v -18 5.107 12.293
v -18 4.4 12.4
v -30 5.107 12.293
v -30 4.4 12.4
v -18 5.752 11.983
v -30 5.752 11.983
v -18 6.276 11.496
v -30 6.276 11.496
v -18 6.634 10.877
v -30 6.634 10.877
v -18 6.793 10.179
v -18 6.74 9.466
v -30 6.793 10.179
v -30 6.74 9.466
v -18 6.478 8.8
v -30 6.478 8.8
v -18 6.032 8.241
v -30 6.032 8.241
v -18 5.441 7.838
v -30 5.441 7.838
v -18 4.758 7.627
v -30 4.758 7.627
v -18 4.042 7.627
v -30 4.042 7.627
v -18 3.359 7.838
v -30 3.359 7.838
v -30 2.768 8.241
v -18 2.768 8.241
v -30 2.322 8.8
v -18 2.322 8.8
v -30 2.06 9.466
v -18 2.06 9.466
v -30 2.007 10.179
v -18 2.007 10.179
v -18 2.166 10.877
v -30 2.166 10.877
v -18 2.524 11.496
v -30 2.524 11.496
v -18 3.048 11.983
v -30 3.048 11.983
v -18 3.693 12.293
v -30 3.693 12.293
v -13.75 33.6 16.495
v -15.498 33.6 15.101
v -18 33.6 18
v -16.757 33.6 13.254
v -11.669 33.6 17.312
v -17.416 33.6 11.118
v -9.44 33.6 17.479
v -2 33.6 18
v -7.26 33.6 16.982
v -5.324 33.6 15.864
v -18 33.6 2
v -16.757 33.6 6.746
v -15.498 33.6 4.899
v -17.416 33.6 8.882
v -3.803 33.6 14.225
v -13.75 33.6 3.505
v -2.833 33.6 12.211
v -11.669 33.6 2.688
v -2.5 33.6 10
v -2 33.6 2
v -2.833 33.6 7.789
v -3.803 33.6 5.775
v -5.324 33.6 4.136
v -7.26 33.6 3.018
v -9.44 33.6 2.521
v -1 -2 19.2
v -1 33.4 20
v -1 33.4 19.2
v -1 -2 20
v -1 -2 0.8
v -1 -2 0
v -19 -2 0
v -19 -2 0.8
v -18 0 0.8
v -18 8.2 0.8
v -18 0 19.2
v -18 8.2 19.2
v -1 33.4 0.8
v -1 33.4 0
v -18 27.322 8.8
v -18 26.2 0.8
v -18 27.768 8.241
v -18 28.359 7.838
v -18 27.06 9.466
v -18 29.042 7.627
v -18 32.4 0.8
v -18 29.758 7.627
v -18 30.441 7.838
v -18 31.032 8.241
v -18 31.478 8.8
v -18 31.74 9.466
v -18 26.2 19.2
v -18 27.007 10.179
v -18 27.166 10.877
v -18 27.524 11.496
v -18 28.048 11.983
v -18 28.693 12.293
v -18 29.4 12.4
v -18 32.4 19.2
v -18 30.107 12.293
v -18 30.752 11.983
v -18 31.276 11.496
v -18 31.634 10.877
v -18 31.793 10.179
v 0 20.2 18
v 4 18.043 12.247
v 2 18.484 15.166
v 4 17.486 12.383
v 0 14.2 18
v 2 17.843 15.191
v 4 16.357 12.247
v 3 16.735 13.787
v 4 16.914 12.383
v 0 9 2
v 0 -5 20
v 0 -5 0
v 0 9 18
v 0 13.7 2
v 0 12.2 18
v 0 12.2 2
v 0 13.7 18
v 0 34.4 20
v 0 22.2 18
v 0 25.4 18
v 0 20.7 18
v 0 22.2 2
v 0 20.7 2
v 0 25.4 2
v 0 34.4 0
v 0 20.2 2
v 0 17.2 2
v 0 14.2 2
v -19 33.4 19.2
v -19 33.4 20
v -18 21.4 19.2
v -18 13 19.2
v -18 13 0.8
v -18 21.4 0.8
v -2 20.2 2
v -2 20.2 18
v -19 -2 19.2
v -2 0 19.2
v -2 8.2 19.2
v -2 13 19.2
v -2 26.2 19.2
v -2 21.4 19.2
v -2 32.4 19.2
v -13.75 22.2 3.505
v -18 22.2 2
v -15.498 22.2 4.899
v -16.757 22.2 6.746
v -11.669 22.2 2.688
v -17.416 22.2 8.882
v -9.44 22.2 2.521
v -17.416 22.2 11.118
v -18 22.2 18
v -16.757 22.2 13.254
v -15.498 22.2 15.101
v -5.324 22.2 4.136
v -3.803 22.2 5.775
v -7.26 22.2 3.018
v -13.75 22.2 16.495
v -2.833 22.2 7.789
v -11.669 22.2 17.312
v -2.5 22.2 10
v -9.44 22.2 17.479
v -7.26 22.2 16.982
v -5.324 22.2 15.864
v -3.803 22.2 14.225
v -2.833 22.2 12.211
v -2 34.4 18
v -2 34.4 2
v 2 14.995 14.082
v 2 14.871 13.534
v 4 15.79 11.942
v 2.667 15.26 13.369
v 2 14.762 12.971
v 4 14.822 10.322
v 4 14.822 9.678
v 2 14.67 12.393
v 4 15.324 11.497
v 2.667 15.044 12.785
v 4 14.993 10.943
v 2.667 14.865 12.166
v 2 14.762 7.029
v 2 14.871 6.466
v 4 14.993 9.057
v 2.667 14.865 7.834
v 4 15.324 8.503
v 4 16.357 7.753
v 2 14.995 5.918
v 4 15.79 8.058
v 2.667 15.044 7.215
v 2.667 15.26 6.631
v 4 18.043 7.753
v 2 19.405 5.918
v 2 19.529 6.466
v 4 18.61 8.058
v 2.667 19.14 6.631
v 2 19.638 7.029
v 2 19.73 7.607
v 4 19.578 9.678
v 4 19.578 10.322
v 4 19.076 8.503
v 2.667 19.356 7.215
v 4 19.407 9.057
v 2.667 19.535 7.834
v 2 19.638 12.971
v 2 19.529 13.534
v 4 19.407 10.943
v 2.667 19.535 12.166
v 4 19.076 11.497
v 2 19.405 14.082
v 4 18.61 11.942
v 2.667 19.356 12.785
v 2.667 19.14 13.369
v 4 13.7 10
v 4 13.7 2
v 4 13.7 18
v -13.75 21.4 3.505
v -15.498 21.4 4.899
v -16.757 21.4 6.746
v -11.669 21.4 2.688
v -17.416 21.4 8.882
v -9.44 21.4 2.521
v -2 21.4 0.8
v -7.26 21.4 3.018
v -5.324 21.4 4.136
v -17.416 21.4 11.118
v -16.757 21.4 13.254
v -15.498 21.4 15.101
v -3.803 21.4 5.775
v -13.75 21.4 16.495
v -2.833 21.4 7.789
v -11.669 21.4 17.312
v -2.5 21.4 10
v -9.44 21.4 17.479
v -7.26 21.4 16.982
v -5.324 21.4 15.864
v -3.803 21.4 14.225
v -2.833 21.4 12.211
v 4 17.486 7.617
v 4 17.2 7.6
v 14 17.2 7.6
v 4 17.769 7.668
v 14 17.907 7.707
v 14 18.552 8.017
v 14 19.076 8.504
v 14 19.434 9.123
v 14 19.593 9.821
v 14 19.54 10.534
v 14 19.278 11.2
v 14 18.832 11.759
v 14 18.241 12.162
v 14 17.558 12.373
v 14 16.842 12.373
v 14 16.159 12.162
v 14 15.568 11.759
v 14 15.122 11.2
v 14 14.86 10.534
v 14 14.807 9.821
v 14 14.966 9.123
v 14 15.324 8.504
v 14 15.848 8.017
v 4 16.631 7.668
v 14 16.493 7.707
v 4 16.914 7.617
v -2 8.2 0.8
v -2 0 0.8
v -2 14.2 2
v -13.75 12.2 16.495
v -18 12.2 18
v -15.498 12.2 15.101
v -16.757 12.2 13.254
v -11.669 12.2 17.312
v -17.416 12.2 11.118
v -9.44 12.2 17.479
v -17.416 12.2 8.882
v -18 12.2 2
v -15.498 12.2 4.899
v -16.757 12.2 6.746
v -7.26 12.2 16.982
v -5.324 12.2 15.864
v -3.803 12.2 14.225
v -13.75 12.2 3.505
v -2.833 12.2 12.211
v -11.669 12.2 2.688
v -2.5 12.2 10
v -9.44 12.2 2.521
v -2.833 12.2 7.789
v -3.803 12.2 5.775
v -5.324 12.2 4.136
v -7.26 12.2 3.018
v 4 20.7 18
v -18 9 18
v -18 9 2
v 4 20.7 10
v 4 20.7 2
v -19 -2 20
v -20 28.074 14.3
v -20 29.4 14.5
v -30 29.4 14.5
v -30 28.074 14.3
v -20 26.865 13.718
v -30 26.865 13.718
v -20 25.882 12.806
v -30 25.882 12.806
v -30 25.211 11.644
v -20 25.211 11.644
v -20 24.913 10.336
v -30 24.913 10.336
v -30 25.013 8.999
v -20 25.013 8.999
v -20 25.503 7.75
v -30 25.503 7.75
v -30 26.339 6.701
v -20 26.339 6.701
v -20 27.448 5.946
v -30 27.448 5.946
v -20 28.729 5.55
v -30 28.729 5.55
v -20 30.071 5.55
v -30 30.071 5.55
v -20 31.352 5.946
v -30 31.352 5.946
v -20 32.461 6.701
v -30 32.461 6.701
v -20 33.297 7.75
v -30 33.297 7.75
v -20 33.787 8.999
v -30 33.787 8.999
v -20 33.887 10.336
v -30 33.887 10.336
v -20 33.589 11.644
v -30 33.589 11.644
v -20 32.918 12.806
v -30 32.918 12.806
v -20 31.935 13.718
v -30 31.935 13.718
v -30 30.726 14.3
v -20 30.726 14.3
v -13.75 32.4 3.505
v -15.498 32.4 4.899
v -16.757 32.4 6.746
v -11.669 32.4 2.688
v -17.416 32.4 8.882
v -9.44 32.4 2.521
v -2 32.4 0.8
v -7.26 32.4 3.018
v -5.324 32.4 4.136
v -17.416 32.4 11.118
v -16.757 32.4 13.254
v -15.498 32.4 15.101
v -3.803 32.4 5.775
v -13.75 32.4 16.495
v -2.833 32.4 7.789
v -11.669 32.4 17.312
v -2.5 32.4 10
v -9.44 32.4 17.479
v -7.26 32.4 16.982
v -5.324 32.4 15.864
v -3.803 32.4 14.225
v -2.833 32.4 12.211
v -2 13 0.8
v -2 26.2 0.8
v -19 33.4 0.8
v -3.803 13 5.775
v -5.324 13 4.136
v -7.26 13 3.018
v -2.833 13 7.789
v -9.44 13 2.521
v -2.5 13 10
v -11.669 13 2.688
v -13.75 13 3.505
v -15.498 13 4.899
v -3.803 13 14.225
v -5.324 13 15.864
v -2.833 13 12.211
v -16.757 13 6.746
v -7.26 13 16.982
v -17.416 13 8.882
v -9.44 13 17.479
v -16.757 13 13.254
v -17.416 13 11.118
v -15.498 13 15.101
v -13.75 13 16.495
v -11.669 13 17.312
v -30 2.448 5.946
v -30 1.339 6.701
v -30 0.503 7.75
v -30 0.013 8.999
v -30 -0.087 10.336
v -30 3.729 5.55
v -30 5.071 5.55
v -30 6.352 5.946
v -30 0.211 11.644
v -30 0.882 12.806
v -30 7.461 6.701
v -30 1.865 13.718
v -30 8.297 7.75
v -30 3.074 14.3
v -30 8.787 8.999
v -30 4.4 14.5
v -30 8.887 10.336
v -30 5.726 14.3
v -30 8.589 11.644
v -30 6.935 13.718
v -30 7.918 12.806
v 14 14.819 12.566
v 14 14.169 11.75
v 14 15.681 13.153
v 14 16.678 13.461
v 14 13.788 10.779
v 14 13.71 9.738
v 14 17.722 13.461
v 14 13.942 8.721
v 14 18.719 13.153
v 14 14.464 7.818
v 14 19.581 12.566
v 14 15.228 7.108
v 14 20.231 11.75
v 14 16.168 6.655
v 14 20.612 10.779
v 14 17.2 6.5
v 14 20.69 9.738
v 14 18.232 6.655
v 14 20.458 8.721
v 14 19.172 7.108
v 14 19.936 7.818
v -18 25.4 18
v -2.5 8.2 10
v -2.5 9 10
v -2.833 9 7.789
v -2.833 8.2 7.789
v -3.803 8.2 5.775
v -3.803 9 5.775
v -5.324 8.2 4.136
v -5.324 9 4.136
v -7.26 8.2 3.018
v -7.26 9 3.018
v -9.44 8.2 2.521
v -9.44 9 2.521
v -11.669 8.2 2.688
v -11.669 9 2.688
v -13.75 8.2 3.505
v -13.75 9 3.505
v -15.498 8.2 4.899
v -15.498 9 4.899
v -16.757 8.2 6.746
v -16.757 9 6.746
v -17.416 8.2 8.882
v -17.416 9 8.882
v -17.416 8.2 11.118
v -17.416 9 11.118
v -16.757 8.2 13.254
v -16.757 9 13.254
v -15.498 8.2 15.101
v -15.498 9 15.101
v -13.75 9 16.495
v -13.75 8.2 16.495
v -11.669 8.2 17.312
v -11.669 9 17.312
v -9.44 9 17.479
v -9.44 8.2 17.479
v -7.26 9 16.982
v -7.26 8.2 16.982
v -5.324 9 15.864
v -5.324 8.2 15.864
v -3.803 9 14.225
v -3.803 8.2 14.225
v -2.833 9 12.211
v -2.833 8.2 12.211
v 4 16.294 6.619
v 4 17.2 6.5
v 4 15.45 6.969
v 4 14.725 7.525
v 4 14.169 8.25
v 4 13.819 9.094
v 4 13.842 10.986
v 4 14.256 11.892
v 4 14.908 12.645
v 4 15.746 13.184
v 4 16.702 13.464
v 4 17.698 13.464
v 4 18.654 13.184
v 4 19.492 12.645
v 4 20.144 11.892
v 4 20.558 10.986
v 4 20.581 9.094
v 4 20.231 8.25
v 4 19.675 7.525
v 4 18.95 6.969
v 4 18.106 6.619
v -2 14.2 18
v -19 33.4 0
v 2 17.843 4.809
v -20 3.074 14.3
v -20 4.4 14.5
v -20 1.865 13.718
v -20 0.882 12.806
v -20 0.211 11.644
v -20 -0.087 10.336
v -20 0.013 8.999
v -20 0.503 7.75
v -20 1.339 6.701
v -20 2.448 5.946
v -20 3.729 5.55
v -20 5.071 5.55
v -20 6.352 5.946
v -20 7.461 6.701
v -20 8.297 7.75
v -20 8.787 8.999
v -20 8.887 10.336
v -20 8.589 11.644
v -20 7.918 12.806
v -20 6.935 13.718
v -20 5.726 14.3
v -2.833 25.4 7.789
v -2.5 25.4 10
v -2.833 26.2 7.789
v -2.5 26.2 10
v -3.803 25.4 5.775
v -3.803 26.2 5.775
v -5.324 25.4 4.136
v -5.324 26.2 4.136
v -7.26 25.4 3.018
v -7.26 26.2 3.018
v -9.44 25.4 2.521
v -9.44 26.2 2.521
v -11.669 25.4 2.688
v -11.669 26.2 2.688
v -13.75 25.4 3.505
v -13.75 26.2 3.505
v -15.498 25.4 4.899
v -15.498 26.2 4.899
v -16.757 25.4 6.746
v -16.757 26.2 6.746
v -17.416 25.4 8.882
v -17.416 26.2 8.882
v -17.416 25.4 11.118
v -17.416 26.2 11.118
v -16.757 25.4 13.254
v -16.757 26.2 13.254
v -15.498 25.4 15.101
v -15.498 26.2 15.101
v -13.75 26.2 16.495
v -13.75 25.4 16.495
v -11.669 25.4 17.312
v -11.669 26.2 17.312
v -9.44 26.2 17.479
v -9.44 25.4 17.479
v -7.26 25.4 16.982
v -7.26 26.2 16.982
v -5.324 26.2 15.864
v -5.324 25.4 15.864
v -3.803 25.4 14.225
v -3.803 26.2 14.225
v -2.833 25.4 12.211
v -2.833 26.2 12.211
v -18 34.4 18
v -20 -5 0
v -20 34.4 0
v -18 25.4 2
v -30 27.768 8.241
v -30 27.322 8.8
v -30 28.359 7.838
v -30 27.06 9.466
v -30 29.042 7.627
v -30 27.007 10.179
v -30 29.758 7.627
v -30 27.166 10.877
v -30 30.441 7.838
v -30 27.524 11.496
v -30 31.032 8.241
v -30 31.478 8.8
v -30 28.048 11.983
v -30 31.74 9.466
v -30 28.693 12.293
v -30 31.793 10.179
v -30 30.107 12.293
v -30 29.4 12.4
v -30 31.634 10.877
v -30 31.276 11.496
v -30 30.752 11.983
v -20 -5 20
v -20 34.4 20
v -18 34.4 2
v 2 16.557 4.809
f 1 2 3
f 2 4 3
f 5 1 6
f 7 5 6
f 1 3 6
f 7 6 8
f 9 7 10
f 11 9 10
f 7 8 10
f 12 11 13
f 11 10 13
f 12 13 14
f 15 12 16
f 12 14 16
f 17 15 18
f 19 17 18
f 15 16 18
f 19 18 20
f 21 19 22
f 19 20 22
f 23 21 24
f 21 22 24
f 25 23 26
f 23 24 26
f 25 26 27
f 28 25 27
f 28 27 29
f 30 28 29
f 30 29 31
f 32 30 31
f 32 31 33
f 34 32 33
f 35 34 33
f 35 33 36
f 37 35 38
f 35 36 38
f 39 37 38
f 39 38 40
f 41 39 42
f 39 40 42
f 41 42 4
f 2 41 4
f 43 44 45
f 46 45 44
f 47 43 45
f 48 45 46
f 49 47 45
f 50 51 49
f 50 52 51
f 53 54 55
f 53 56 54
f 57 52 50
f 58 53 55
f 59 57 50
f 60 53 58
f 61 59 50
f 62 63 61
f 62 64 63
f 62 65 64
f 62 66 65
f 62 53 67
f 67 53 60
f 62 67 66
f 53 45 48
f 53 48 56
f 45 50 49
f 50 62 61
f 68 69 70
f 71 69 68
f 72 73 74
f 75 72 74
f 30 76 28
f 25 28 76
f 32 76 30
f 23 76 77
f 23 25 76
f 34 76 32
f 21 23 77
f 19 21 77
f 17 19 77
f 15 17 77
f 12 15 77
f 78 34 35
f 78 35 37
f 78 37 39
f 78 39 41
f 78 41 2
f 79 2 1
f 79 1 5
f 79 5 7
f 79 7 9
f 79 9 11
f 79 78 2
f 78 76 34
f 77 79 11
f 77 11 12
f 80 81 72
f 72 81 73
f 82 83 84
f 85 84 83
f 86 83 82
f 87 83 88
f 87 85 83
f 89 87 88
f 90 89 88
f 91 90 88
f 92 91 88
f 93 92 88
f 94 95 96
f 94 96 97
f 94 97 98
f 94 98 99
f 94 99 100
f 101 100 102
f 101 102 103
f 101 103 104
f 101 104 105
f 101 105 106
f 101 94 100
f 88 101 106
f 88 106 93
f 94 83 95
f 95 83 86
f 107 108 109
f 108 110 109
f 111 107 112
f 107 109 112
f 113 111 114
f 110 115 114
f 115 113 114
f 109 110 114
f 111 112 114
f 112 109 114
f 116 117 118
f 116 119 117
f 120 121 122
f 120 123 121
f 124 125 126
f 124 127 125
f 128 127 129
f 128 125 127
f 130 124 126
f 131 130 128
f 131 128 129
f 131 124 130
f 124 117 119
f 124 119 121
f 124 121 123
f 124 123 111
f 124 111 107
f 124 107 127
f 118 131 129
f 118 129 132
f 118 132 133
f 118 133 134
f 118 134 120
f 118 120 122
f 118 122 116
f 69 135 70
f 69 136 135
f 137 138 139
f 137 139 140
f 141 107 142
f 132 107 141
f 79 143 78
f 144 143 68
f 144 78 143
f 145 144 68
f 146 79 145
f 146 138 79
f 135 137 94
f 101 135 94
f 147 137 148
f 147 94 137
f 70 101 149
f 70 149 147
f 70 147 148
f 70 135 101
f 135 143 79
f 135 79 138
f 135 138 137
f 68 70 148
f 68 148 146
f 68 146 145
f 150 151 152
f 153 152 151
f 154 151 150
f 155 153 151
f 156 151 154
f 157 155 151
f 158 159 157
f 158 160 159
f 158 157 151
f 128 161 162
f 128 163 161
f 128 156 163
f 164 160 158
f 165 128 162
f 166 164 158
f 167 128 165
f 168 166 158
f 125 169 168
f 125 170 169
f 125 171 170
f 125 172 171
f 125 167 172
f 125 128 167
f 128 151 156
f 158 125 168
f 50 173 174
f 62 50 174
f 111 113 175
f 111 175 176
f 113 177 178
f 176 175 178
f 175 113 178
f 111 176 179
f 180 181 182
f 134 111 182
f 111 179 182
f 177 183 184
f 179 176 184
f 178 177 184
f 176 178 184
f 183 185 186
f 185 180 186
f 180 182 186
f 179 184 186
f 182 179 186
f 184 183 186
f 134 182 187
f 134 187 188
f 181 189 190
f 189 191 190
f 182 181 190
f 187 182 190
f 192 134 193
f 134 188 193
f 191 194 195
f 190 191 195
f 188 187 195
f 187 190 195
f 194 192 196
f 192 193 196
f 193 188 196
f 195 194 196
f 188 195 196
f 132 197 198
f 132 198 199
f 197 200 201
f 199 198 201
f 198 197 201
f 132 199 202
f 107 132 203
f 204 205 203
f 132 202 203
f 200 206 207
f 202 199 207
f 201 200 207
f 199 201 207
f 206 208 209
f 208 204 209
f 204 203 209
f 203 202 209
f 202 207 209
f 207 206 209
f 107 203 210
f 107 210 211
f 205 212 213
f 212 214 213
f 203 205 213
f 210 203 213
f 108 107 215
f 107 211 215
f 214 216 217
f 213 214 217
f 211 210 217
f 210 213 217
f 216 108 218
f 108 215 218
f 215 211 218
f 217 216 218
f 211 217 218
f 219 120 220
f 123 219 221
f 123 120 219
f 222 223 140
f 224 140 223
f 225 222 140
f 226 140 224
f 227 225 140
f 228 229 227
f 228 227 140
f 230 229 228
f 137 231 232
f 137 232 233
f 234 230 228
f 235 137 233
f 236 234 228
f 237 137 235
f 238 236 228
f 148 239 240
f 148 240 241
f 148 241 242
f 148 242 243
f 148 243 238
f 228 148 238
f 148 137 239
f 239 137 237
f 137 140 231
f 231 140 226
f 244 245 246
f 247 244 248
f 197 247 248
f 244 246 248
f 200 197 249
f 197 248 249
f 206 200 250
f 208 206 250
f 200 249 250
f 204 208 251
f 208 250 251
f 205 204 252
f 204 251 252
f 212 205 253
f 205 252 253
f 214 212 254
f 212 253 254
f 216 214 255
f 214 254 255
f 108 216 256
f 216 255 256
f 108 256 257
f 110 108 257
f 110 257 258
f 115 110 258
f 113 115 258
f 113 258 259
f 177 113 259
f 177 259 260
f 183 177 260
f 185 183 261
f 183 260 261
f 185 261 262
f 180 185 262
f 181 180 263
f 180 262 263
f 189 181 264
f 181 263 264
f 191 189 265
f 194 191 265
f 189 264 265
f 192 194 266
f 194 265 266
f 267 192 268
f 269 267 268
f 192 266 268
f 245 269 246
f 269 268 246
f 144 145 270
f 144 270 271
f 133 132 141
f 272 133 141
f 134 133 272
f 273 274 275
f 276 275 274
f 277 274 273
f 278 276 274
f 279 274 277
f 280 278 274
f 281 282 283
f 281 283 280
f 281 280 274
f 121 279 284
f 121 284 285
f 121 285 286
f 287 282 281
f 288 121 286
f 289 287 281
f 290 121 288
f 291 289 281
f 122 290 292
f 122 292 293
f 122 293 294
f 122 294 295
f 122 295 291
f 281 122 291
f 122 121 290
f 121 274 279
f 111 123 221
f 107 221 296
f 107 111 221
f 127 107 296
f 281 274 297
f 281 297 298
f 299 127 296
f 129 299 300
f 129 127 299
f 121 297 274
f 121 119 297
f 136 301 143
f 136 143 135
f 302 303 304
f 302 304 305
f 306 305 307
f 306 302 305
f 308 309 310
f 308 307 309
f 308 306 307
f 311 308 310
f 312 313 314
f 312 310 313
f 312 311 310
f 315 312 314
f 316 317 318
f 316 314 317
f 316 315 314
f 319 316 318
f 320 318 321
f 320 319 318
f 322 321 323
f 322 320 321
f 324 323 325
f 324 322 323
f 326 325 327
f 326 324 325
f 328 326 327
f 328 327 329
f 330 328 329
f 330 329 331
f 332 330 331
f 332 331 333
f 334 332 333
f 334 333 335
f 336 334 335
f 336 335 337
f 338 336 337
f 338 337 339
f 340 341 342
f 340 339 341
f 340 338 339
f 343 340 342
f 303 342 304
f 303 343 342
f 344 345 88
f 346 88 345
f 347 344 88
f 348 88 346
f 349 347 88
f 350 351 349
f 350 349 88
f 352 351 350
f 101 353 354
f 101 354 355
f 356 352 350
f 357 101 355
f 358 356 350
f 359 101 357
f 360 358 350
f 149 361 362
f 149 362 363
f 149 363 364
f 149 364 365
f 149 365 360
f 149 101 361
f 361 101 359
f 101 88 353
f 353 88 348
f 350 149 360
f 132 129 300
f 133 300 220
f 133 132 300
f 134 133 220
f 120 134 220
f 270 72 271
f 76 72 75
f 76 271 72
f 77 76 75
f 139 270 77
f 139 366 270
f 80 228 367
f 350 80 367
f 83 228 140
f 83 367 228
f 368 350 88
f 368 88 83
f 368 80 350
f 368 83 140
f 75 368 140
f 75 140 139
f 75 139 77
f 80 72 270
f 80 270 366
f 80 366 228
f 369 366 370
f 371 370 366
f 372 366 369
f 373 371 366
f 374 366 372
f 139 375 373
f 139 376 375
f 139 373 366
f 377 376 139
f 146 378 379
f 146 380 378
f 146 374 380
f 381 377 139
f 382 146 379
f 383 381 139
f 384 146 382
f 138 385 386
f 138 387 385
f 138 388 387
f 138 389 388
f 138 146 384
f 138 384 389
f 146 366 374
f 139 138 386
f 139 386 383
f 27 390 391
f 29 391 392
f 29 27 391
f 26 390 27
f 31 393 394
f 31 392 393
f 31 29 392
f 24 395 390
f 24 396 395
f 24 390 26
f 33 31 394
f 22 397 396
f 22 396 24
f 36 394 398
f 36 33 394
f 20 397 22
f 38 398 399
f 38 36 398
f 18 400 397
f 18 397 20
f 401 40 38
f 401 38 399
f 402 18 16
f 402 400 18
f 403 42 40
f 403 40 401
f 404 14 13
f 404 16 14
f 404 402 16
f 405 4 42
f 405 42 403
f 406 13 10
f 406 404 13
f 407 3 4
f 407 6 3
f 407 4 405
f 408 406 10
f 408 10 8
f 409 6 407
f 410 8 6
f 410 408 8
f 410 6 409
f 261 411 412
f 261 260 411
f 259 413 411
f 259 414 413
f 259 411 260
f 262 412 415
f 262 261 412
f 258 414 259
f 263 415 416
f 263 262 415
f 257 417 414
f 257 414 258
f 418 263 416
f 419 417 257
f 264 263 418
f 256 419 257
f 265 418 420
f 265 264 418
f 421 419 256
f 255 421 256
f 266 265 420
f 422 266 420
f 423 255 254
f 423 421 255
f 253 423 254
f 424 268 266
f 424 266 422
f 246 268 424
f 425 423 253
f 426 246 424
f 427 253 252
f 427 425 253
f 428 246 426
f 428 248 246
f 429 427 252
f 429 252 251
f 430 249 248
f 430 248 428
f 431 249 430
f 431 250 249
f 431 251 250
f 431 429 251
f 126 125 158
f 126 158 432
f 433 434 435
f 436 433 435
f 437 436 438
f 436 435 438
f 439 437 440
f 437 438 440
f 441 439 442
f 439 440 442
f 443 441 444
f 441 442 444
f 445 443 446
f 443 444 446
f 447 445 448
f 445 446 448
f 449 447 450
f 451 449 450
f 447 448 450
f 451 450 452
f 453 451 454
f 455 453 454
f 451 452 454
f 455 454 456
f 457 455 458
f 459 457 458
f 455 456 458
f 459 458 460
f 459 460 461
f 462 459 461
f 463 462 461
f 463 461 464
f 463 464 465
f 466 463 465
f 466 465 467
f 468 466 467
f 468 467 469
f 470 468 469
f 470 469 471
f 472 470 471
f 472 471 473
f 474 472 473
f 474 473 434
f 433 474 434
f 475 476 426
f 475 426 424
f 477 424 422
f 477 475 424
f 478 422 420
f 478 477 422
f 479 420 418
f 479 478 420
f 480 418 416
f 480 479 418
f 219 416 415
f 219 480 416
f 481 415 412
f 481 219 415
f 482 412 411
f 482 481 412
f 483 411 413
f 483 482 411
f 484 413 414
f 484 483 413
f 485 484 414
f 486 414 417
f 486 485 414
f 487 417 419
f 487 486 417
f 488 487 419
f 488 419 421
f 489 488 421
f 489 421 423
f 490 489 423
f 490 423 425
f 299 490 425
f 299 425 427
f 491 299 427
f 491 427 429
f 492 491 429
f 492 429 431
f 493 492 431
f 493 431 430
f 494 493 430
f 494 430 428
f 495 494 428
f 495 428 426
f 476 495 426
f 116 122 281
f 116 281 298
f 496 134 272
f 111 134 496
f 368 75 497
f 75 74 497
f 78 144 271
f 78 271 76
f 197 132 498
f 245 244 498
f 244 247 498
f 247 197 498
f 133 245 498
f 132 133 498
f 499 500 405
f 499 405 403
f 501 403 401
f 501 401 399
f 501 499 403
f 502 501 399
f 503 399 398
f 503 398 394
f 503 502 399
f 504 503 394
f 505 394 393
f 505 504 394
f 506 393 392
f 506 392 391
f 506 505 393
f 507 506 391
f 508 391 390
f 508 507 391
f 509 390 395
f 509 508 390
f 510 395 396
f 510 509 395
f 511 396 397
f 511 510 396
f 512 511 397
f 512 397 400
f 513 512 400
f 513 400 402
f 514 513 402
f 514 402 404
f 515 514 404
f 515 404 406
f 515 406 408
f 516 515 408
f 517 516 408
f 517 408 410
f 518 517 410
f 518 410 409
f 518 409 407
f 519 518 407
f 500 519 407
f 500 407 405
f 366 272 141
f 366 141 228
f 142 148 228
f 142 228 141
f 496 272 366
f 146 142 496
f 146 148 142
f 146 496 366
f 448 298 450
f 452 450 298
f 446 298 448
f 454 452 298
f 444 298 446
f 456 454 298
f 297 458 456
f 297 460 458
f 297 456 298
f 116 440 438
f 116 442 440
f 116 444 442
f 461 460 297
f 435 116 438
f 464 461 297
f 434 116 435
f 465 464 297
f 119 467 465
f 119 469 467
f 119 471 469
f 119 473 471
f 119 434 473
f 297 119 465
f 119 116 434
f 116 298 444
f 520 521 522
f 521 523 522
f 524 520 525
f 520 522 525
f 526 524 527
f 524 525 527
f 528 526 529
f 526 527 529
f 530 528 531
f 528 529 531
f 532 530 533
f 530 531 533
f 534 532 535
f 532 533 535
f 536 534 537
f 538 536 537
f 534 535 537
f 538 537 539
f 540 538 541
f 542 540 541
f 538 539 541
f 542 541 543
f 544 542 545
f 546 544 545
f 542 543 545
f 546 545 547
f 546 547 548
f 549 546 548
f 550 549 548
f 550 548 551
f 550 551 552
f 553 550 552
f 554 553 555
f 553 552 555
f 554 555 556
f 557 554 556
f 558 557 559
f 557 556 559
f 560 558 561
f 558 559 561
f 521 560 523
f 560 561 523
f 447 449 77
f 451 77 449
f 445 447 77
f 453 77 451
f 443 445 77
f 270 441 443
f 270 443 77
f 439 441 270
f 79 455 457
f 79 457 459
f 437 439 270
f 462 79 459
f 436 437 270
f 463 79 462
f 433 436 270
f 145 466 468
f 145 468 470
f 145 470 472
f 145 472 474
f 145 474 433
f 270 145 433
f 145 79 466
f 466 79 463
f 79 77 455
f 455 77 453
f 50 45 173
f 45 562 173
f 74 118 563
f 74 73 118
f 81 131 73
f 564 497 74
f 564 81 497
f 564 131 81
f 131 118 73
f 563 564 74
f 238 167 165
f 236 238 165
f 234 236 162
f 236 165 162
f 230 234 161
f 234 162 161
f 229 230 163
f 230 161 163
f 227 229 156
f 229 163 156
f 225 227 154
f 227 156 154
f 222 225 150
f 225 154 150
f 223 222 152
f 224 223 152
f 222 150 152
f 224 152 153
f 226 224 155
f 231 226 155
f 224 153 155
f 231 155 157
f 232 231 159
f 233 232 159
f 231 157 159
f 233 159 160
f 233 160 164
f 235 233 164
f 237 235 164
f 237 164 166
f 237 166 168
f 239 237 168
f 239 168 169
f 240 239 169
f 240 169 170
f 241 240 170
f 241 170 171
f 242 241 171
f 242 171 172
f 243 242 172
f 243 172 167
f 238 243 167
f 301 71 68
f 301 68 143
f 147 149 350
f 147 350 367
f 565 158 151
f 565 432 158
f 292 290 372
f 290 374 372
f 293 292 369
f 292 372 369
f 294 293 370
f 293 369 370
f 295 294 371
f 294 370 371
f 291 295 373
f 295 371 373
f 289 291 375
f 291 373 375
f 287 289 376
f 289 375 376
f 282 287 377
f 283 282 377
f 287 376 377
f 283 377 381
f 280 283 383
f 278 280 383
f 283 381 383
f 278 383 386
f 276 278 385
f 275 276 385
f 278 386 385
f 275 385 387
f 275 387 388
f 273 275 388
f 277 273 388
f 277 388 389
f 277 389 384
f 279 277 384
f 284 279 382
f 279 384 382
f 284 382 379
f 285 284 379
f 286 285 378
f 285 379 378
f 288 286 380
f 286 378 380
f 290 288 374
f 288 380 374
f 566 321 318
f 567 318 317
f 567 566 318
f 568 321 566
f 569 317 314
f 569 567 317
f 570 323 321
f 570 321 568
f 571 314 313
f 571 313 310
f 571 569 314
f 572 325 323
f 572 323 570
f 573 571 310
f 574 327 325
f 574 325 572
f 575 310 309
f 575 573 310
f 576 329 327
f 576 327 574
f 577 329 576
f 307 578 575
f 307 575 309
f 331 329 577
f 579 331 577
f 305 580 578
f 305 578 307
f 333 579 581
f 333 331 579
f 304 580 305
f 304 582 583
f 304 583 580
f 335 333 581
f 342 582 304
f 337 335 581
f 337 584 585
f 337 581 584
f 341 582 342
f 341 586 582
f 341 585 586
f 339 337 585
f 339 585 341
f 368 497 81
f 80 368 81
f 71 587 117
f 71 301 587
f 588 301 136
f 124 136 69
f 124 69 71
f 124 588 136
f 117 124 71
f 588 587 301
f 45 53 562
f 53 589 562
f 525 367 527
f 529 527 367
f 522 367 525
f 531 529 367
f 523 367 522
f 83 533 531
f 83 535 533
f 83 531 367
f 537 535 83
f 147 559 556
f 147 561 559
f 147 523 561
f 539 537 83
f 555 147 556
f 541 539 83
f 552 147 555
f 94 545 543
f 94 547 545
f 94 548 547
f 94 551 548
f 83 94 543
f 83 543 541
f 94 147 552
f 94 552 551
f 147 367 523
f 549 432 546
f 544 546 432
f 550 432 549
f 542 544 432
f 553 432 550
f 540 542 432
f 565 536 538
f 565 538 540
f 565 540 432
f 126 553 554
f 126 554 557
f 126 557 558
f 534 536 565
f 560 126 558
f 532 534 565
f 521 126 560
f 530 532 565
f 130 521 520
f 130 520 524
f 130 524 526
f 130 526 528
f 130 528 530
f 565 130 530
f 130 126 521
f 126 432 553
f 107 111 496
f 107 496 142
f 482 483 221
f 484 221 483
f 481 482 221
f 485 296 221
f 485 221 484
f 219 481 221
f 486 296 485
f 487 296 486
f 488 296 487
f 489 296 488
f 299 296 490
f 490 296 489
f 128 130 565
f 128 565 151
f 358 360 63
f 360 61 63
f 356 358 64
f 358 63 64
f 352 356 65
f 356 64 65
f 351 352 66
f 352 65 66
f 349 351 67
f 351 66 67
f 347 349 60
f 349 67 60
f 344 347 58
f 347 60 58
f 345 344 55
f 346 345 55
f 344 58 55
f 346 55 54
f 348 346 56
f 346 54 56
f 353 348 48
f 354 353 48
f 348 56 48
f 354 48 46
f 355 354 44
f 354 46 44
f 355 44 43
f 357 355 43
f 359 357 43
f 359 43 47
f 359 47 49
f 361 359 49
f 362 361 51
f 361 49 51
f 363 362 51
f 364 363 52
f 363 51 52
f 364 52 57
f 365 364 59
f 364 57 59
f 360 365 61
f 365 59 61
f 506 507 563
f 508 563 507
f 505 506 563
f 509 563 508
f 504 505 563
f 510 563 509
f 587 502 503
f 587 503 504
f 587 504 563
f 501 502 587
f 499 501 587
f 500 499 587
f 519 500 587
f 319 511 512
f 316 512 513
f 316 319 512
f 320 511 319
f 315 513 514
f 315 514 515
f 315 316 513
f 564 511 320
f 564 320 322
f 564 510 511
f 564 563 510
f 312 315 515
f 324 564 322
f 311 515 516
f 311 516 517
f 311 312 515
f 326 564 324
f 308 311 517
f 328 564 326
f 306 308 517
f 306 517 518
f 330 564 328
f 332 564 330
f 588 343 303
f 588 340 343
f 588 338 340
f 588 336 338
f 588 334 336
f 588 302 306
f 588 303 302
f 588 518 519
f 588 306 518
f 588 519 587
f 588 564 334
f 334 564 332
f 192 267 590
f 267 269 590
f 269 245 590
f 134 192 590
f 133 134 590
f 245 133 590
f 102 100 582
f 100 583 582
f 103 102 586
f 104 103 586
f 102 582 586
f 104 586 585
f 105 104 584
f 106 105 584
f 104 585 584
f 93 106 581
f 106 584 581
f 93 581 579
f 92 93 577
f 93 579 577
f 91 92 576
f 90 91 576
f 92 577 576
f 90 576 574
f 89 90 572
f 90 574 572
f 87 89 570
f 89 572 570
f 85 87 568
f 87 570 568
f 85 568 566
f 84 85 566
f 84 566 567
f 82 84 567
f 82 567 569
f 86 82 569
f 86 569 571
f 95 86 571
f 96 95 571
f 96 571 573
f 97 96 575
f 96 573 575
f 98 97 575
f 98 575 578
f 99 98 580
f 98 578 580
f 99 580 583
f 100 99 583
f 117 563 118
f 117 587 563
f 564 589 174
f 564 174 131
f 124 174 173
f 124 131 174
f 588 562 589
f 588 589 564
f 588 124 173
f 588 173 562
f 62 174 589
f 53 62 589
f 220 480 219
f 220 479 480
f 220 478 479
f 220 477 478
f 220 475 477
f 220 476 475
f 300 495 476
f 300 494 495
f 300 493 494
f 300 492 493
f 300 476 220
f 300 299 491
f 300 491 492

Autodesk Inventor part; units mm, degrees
ref_plane "YZ Plane" through (0, 0, 0) normal (1, 0, 0) x (0, 1, 0)
ref_plane "XZ Plane" through (0, 0, 0) normal (0, 1, 0) x (-1, 0, 0)
ref_plane "XY Plane" through (0, 0, 0) normal (0, 0, 1) x (1, 0, 0)
sketch "Sketch1" plane through (0, 0, 0) normal (0, 1, 0) x (-1, 0, 0)
  line L0 (0, 0) -> (20, 0)
  line L1 (20, 0) -> (20, 20)
  line L2 (20, 20) -> (0, 20)
  line L3 (0, 20) -> (0, 0)
  dimension "d0" = 20
  dimension "d1" = 20
extrude "Extrusion1" add sketch "Sketch1" along normal blind 34.4
sketch "Sketch2" plane through (0, 34.4, 0) normal (0, 1, 0) x (1, 0, 0)
  circle A0 centre (-10, -10) radius 7.5
  line L0 (0, 0) -> (-20, 0) projected
  line L1 (0, -20) -> (0, 0) projected
  dimension "d4" = 10
  dimension "d5" = 10
  dimension "d6" = 15
extrude "Extrusion2" cut sketch "Sketch2" against normal blind 30
sketch "Sketch3" plane through (0, 0, 20) normal (1, 0, 0) x (0, 0, -1)
  line L0 (2, 12.2) -> (18, 12.2)
  line L1 (18, 12.2) -> (18, 9)
  line L2 (18, 9) -> (2, 9)
  line L3 (2, 9) -> (2, 12.2)
  line L4 (20, 0) -> (20, 34.4) projected
  line L5 (0, 0) -> (20, 0) projected
  dimension "d9" = 3.2
  dimension "d12" = 16
  dimension "d13" = 2
  dimension "d14" = 9
extrude "Extrusion3" cut sketch "Sketch3" against normal blind 18
sketch "Sketch4" plane through (0, 0, 20) normal (1, 0, 0) x (0, 0, -1)
  line L0 (2, 25.4) -> (18, 25.4)
  line L1 (18, 25.4) -> (18, 22.2)
  line L2 (18, 22.2) -> (2, 22.2)
  line L3 (2, 22.2) -> (2, 25.4)
  line L4 (20, 0) -> (20, 34.4) projected
  line L5 (0, 0) -> (20, 0) projected
  line L6 (2, 12.2) -> (18, 12.2) projected
  dimension "d17" = 2
  dimension "d18" = 16
  dimension "d19" = 3.2
  dimension "d21" = 10
extrude "Extrusion4" cut sketch "Sketch4" against normal blind 18
sketch "Sketch5" plane through (0, 34.4, 0) normal (0, 1, 0) x (1, 0, 0)
  line L0 (-18, -18) -> (-2, -18)
  line L1 (-2, -18) -> (-2, -2)
  line L2 (-2, -2) -> (-18, -2)
  line L3 (-18, -2) -> (-18, -18)
  line L4 (-20, 0) -> (-20, -20) projected
  line L5 (-20, -20) -> (0, -20) projected
  line L6 (0, -20) -> (0, 0) projected
  line L7 (0, 0) -> (-20, 0) projected
  dimension "d24" = 2
  dimension "d25" = 2
  dimension "d26" = 2
  dimension "d27" = 2
extrude "Extrusion5" cut sketch "Sketch5" against normal blind 0.8 contours L3 L2 L1 L0
sketch "Sketch10" plane through (0, 0, 20) normal (1, 0, 0) x (0, 0, -1)
  line L0 (2, 20.2) -> (18, 20.2)
  line L1 (18, 20.2) -> (18, 14.2)
  line L2 (18, 14.2) -> (2, 14.2)
  line L3 (2, 14.2) -> (2, 20.2)
  line L4 (18, 22.2) -> (2, 22.2) projected
  line L5 (0, 0) -> (0, 34.4) projected
  line L6 (2, 12.2) -> (18, 12.2) projected
  line L7 (20, 0) -> (20, 34.4) projected
  dimension "d46" = 2
  dimension "d47" = 2
  dimension "d48" = 2
  dimension "d49" = 2
extrude "Extrusion7" cut sketch "Sketch10" against normal blind 17.5
sketch "Sketch6" plane through (0, 0, 20) normal (1, 0, 0) x (0, 0, -1)
  line L0 (2, 20.7) -> (18, 20.7)
  line L1 (18, 20.7) -> (18, 13.7)
  line L2 (18, 13.7) -> (2, 13.7)
  line L3 (2, 13.7) -> (2, 20.7)
  line L4 (0, 0) -> (0, 34.4) projected
  line L5 (20, 0) -> (20, 34.4) projected
  line L6 (18, 22.2) -> (2, 22.2) projected
  line L7 (2, 12.2) -> (18, 12.2) projected
  dimension "d30" = 2
  dimension "d31" = 2
  dimension "d32" = 1.5
  dimension "d33" = 1.5
extrude "Extrusion6" add sketch "Sketch6" along normal blind 4
sketch "Sketch7" plane through (4, 0, 20) normal (1, 0, 0) x (0, 0, -1)
  circle A0 centre (10, 17.2) radius 2.4
  line L0 (18, 20.7) -> (2, 20.7) projected
  line L1 (18, 13.7) -> (18, 20.7) projected
  point P0 (20, 0)
  dimension "d36" = 4.8
  dimension "d37" = 3.5
  dimension "d38" = 8
loft "Loft2" cut profiles "Sketch10", "Sketch7"
sketch "Sketch11" plane through (4, 0, 20) normal (1, 0, 0) x (0, 0, -1)
  circle A0 centre (10, 17.2) radius 3.5
  line L0 (2, 13.7) -> (18, 13.7) projected
  line L1 (18, 13.7) -> (18, 20.7) projected
  point P0 (20, 0)
  dimension "d56" = 7
  dimension "d57" = 3.5
  dimension "d58" = 8
extrude "Extrusion8" add sketch "Sketch11" along normal blind 10
sketch "Sketch12" plane through (14, 17.2, 10) normal (1, 0, 0) x (0, 0, -1)
  circle A0 centre (0, 0) radius 2.4
  circle A1 centre (0, 0) radius 3.5 projected
  line L0 (8, -3.5) -> (8, 3.5) projected
  point P0 (10, -17.2)
  dimension "d62" = 4.8
  dimension "d63" = 0
  dimension "d64" = 8
extrude "Extrusion9" cut sketch "Sketch12" against normal blind 10 contours A0
sketch "Sketch13" plane through (-20, 0, 0) normal (-1, 0, 0) x (0, 0, 1)
  circle A0 centre (10, 4.4) radius 4.5
  line L0 (0, 0) -> (0, 34.4) projected
  line L1 (0, 0) -> (20, 0) projected
  dimension "d67" = 9
  dimension "d68" = 10
  dimension "d69" = 4.4
sketch "Sketch14" plane through (-20, 0, 0) normal (-1, 0, 0) x (0, 0, 1)
  circle A0 centre (10, 4.4) radius 2.4
  line L0 (20, 0) -> (20, 34.4) projected
  line L1 (0, 0) -> (0, 34.4) projected
  line L2 (0, 0) -> (20, 0) projected
  dimension "d71" = 10
  dimension "d72" = 4.4
  dimension "d90" = 4.8
extrude "Extrusion10" cut sketch "Sketch14" against normal blind 4
extrude "Extrusion11" add sketch "Sketch13" along normal blind 10
sketch "Sketch15" plane through (-30, 4.4, 10) normal (-1, 0, 0) x (0, 0, 1)
  circle A0 centre (0, 0) radius 2.4
  point P0 (-10, -4.4)
  dimension "d77" = 4.8
extrude "Extrusion12" cut sketch "Sketch15" against normal blind 10
sketch "Sketch16" plane through (-20, 0, 20) normal (-1, 0, 0) x (0, 0, 1)
  circle A0 centre (-10, 29.4) radius 4.5
  line L0 (0, 0) -> (0, 34.4) projected
  line L1 (-20, 34.4) -> (0, 34.4) projected
  point P0 (-20, 0)
  dimension "d80" = 10
  dimension "d81" = 5
  dimension "d82" = 9
extrude "Extrusion13" add sketch "Sketch16" along normal blind 10
sketch "Sketch17" plane through (-30, 29.4, 10) normal (-1, 0, 0) x (0, 0, 1)
  circle A0 centre (0, 0) radius 2.4
  point P0 (-10, -29.4)
  dimension "d85" = 4.8
extrude "Extrusion14" cut sketch "Sketch17" against normal blind 14
sketch "Sketch18" plane through (0, 0, 0) normal (0, -1, 0) x (1, 0, 0)
  line L0 (-20, 20) -> (0, 20) projected
  line L1 (0, 20) -> (0, 0) projected
  line L2 (-20, 20) -> (0, 20)
  line L3 (0, 20) -> (0, 0)
  line L4 (0, 0) -> (-20, 0)
  line L5 (-20, 0) -> (-20, 20)
extrude "Extrusion15" add sketch "Sketch18" along normal blind 5
sketch "Sketch19" plane through (-20, 34.4, 20) normal (0, 0, 1) x (1, 0, 0)
  line L0 (2, -26.2) -> (18, -26.2)
  line L1 (18, -26.2) -> (18, -34.4)
  line L2 (18, -34.4) -> (2, -34.4)
  line L3 (2, -34.4) -> (2, -26.2)
  line L4 (20, -39.4) -> (0, -39.4) projected
  line L5 (20, -39.4) -> (20, 0) projected
  line L6 (0, -39.4) -> (0, 0) projected
  point P0 (20, -34.4)
  dimension "d91" = 13.2
  dimension "d92" = 5
  dimension "d93" = 2
  dimension "d94" = 2
extrude "Extrusion16" cut sketch "Sketch19" against normal blind 20
sketch "Sketch20" plane through (-20, 34.4, 20) normal (0, 0, 1) x (1, 0, 0)
  line L0 (18, -21.4) -> (2, -21.4)
  line L1 (2, -21.4) -> (2, -13)
  line L2 (2, -13) -> (18, -13)
  line L3 (18, -13) -> (18, -21.4)
  line L4 (0, -39.4) -> (0, 0) projected
  line L5 (20, -39.4) -> (20, 0) projected
  line L6 (20, -39.4) -> (0, -39.4) projected
  point P0 (20, -34.4)
  dimension "d97" = 2
  dimension "d98" = 2
  dimension "d99" = 18
  dimension "d100" = 8.4
extrude "Extrusion17" cut sketch "Sketch20" against normal blind 20
sketch "Sketch21" plane through (-20, 34.4, 20) normal (0, 0, 1) x (1, 0, 0)
  line L0 (18, -8.2) -> (2, -8.2)
  line L1 (2, -8.2) -> (2, -2)
  line L2 (2, -2) -> (18, -2)
  line L3 (18, -2) -> (18, -8.2)
  line L4 (20, -39.4) -> (20, 0) projected
  line L5 (0, -39.4) -> (0, 0) projected
  line L6 (0, 0) -> (20, 0) projected
  point P0 (20, -34.4)
  dimension "d103" = 2
  dimension "d104" = 2
  dimension "d105" = 2
  dimension "d106" = 8.2
extrude "Extrusion18" cut sketch "Sketch21" against normal blind 20
sketch "Sketch22" plane through (-20, 34.4, 20) normal (0, 0, 1) x (1, 0, 0)
  line L0 (1, -1) -> (19, -1)
  line L1 (19, -1) -> (19, -36.4)
  line L2 (19, -36.4) -> (1, -36.4)
  line L3 (1, -36.4) -> (1, -1)
  line L4 (0, 0) -> (20, 0) projected
  line L5 (20, -39.4) -> (20, 0) projected
  line L6 (0, -39.4) -> (0, 0) projected
  line L7 (18, -34.4) -> (2, -34.4) projected
  point P0 (20, -34.4)
  dimension "d109" = 1
  dimension "d110" = 1
  dimension "d112" = 1
  dimension "d115" = 2
extrude "Extrusion19" cut sketch "Sketch22" against normal blind 0.8
sketch "Sketch23" plane through (0, 34.4, 0) normal (0, 0, -1) x (-1, 0, 0)
  line L0 (1, -36.4) -> (19, -36.4)
  line L1 (19, -36.4) -> (19, -1)
  line L2 (19, -1) -> (1, -1)
  line L3 (1, -1) -> (1, -36.4)
  line L4 (0, 0) -> (20, 0) projected
  line L5 (0, 0) -> (0, -39.4) projected
  line L6 (20, -39.4) -> (20, 0) projected
  line L7 (18, -34.4) -> (2, -34.4) projected
  point P0 (0, -34.4)
  dimension "d116" = 1
  dimension "d117" = 1
  dimension "d118" = 1
  dimension "d119" = 2
extrude "Extrusion20" cut sketch "Sketch23" against normal blind 0.8
properties part number "HDAcell_Daniela_thickelecrode_08172020"
